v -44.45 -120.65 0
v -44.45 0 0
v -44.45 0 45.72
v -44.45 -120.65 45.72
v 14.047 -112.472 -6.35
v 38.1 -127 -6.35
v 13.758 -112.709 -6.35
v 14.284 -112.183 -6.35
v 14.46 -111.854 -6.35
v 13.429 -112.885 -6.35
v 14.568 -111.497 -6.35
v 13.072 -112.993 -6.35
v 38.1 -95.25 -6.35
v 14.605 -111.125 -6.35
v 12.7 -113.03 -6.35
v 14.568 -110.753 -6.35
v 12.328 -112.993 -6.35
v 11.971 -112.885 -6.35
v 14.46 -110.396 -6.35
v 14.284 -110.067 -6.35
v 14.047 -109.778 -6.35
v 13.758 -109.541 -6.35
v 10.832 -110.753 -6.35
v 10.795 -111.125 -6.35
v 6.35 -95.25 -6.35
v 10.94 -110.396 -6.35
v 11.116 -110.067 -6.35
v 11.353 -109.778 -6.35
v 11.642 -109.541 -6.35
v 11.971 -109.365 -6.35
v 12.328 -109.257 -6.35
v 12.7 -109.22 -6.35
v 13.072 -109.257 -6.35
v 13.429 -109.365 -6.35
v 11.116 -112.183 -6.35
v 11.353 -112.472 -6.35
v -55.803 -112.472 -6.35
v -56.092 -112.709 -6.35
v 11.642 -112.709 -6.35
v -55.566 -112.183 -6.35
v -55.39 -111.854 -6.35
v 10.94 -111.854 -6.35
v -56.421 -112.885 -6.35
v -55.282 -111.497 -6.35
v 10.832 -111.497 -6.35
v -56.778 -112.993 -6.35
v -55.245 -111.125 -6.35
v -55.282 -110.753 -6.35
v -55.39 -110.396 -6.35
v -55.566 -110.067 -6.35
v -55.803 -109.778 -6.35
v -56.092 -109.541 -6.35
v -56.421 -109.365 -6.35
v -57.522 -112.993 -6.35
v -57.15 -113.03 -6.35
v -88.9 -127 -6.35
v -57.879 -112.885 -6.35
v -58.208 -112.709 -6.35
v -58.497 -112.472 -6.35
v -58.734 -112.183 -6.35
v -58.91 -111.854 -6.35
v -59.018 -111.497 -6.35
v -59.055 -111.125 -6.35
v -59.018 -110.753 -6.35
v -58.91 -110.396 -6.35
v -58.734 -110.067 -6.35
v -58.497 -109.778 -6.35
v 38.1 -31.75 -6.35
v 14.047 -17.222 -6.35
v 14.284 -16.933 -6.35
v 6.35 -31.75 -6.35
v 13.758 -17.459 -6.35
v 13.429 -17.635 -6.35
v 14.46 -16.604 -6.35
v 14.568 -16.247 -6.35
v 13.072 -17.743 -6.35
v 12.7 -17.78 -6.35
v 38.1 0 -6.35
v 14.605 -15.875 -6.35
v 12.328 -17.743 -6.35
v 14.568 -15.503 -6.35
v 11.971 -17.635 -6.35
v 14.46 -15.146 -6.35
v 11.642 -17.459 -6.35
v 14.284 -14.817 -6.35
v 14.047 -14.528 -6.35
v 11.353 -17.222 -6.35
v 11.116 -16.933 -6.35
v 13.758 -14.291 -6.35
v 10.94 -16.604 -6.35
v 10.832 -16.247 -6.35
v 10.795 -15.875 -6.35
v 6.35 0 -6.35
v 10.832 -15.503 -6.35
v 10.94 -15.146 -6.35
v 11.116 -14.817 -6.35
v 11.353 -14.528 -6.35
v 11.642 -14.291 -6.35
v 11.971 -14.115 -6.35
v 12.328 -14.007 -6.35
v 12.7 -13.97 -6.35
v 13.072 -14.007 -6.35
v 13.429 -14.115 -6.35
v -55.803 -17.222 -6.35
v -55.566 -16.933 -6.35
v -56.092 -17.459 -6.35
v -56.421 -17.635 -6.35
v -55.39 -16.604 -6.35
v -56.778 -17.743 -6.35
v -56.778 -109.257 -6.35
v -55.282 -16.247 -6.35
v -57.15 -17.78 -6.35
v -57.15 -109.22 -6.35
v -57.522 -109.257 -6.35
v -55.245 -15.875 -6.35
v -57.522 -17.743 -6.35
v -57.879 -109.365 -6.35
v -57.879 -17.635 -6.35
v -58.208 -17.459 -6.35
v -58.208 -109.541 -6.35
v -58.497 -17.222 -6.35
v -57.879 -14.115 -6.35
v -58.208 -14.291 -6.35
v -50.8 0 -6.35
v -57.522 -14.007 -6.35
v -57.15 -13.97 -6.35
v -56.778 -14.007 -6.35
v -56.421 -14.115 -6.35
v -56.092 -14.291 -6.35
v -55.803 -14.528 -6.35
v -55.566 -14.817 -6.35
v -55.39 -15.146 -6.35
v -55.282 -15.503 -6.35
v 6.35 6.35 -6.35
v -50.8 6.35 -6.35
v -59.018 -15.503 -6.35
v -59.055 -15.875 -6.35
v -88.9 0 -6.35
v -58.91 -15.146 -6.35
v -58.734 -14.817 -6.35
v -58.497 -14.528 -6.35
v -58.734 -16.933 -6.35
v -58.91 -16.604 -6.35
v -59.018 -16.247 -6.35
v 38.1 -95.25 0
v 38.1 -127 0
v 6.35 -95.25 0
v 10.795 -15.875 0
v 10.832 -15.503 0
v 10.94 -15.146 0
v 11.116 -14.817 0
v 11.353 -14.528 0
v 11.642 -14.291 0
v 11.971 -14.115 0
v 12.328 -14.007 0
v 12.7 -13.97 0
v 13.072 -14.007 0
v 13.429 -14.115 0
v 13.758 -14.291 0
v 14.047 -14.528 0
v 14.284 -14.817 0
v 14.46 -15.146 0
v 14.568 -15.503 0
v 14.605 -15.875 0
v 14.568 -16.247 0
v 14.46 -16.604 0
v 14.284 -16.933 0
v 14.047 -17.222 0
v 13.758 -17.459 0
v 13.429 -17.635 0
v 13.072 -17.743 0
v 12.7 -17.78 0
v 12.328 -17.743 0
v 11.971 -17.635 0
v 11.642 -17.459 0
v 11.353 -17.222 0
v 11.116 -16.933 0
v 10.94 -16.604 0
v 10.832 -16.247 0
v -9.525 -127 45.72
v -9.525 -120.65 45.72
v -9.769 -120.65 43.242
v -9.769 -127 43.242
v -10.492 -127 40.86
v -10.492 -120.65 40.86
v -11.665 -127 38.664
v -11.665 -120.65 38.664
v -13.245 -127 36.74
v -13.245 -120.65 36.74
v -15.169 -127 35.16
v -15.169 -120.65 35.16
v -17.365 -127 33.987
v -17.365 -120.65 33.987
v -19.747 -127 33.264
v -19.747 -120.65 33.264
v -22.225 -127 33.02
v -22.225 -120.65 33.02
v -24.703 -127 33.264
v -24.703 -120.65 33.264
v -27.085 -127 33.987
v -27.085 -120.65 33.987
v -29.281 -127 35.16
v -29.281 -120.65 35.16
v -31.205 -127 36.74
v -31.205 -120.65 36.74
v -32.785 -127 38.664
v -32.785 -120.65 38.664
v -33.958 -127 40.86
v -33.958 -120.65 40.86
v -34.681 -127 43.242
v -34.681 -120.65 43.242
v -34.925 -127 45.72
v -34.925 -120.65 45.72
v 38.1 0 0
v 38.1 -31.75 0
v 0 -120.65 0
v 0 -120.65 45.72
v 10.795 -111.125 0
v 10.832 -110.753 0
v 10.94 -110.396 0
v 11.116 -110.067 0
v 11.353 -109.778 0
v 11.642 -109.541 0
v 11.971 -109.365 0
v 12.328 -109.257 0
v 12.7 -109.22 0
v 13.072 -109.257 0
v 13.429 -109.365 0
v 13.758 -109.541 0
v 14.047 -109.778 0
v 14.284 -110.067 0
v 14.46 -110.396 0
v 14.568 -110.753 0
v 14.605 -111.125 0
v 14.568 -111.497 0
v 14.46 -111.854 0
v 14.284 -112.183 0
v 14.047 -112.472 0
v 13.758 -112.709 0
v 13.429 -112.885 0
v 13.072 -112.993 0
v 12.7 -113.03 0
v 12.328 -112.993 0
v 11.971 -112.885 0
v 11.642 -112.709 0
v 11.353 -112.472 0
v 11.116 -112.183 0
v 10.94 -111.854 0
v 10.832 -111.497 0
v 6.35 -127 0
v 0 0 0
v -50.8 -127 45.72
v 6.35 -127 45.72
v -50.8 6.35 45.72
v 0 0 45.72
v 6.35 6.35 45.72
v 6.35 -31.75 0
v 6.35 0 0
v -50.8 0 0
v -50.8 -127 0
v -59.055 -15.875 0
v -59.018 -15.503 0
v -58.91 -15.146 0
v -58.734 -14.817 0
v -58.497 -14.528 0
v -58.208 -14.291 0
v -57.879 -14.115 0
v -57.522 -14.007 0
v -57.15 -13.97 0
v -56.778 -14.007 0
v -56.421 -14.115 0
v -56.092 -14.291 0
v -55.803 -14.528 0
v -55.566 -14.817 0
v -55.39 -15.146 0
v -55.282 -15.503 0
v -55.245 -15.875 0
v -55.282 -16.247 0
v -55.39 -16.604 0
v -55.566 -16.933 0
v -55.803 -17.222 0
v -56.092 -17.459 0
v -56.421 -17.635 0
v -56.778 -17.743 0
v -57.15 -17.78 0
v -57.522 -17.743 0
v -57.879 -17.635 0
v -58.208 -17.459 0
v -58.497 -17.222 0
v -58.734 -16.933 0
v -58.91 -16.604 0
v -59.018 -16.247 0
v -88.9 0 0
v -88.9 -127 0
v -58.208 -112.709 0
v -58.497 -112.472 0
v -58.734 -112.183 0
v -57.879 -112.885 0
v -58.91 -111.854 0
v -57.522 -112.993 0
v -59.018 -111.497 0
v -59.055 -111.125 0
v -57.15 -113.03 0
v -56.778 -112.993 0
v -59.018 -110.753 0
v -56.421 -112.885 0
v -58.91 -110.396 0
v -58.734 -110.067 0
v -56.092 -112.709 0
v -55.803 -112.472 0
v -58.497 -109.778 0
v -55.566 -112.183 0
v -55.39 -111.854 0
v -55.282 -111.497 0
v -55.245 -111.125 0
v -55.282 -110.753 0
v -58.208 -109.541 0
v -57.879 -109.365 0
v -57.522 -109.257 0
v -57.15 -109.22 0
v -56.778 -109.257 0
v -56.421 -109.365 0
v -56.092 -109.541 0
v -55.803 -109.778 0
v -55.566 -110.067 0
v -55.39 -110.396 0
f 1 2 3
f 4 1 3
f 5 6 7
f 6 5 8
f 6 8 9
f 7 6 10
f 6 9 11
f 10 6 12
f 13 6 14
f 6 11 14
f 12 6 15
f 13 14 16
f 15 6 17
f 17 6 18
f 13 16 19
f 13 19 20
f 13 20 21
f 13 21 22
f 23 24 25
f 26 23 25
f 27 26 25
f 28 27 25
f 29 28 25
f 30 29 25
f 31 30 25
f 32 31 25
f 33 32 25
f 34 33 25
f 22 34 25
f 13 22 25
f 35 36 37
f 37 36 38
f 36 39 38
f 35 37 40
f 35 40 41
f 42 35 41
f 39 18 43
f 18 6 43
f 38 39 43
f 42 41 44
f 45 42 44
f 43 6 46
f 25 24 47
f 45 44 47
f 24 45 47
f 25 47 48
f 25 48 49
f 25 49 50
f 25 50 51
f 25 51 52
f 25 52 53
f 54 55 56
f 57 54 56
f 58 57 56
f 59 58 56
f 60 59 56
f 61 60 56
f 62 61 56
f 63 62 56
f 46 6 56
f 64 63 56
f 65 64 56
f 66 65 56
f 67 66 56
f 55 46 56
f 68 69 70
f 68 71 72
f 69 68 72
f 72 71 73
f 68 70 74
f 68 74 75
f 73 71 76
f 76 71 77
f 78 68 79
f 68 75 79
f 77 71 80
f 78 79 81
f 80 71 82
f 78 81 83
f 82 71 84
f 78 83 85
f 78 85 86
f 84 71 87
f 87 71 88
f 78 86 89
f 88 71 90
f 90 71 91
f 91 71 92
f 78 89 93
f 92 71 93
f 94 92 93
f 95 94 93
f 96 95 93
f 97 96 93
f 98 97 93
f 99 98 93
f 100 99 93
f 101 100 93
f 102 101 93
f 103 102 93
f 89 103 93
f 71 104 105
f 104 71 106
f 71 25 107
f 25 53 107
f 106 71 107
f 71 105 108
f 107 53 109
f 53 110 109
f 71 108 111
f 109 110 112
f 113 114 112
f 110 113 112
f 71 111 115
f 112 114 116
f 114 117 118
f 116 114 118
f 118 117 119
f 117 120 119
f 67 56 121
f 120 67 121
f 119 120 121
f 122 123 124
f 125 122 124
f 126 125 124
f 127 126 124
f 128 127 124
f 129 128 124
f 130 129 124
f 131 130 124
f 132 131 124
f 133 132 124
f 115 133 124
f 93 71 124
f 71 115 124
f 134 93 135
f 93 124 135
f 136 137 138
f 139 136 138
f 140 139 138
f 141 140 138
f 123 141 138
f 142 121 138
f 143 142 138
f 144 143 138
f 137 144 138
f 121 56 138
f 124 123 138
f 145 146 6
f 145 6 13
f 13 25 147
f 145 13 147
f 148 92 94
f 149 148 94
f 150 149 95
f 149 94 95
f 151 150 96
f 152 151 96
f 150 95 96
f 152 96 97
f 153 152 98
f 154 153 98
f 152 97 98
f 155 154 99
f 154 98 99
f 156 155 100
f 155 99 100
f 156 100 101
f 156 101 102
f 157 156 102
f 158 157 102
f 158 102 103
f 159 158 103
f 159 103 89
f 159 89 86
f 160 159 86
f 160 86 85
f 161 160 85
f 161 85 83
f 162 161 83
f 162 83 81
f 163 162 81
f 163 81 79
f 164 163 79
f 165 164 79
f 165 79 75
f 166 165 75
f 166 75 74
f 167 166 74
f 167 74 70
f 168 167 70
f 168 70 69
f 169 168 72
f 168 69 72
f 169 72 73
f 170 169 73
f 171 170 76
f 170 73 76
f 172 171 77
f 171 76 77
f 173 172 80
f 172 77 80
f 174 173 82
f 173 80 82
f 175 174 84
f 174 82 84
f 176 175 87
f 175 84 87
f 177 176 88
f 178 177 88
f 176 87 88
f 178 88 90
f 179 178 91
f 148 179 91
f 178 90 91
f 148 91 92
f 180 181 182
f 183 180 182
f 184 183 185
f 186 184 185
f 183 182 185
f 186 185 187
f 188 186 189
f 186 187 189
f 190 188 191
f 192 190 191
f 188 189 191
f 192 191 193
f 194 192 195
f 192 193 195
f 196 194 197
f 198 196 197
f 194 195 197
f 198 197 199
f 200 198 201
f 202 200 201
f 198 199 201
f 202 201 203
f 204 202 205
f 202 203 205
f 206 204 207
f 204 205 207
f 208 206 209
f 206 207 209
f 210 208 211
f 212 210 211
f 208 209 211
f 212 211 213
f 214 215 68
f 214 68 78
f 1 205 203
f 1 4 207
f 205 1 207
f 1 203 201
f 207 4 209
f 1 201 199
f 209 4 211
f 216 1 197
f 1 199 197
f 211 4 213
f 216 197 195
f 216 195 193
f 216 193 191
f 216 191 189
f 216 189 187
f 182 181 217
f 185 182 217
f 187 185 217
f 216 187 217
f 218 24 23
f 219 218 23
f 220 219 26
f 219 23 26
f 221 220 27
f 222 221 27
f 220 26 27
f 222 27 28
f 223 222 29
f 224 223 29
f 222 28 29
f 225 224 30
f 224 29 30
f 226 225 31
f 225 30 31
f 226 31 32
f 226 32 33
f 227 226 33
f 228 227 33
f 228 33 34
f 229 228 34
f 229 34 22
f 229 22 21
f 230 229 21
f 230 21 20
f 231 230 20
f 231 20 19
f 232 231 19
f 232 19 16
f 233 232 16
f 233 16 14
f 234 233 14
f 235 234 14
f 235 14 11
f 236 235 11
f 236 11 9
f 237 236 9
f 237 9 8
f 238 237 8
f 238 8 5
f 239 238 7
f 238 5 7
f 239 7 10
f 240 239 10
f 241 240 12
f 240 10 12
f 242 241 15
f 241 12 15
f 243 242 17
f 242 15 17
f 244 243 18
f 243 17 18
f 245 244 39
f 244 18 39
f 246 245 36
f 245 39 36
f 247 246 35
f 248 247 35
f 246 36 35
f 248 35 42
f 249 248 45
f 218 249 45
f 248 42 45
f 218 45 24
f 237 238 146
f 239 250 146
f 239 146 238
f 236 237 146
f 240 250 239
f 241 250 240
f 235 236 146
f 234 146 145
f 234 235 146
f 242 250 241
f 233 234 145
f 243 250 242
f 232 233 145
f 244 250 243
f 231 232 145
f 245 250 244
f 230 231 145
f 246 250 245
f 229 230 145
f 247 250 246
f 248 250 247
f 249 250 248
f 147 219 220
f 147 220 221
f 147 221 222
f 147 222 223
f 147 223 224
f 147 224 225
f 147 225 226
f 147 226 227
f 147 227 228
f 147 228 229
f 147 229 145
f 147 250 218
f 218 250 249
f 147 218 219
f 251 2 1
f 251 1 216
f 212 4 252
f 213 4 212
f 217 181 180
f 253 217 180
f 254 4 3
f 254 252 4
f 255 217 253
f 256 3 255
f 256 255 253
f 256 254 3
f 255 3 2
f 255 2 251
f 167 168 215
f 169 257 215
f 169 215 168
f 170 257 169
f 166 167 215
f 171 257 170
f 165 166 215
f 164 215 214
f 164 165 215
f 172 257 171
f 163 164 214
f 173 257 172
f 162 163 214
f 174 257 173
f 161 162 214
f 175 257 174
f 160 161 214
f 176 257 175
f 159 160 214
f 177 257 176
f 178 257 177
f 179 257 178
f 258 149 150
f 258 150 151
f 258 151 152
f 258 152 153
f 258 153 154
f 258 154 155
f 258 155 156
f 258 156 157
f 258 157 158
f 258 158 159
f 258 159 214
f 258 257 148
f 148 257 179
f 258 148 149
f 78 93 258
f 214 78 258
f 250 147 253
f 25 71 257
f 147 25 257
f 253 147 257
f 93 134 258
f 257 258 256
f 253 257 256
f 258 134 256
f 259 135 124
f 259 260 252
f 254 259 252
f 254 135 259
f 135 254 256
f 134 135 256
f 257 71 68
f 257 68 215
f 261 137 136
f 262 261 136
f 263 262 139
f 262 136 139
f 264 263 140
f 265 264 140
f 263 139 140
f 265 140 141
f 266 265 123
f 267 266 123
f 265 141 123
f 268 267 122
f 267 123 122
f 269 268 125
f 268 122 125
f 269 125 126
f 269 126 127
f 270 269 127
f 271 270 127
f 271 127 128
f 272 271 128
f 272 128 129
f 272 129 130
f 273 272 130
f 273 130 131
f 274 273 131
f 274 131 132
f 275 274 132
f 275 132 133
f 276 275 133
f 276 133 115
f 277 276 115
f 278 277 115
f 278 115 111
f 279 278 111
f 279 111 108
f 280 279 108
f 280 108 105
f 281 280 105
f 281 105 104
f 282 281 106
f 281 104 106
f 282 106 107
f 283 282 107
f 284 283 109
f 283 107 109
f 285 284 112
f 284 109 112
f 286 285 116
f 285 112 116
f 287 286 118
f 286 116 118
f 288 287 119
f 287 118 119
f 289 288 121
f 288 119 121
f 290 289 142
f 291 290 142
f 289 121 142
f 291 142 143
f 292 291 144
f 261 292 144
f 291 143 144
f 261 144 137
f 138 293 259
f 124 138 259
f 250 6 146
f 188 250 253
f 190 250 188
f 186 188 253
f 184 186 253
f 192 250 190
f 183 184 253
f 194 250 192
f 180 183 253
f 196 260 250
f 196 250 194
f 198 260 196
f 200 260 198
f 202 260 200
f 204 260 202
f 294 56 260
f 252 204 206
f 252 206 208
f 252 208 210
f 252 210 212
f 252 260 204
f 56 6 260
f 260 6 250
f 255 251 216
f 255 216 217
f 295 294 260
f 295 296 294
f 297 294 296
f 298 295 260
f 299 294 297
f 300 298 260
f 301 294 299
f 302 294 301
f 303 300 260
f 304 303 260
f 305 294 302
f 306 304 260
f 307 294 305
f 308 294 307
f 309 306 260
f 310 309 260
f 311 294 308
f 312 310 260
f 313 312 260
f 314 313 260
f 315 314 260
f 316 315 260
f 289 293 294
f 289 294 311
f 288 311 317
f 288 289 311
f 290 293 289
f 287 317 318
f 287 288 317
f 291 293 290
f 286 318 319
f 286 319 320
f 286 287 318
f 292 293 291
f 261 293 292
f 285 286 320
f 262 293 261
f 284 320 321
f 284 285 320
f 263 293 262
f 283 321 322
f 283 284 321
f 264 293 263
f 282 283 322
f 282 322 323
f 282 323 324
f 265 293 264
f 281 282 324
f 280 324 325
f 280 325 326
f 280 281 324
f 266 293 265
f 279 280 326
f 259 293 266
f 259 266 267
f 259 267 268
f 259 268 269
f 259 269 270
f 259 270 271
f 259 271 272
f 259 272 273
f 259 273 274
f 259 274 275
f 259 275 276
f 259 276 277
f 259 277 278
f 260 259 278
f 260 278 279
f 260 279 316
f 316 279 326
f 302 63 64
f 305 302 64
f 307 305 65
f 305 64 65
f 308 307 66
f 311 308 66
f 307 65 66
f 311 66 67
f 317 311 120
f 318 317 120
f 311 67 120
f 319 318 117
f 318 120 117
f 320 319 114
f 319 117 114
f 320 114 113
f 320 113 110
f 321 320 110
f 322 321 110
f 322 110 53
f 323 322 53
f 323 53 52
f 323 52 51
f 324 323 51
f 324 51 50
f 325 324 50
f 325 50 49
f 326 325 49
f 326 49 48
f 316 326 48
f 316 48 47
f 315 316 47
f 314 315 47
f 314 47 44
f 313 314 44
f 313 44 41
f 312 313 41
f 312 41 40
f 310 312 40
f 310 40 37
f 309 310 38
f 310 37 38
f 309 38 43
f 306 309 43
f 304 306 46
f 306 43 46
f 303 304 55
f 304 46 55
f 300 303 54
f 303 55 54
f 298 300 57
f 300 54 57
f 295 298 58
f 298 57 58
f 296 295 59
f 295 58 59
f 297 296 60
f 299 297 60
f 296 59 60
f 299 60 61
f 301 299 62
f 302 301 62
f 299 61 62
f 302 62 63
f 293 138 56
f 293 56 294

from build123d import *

# Parameters (mm, degrees)
F0_W      = 44.45
F0_H      = 45.72
F1_DEPTH  = 120.65
F2_T      = 6.35
F4_W      = 38.1
F4_H      = 6.35
F5_DEPTH  = 127
F6_W      = 31.75
F6_H      = 6.35
F7_DEPTH  = 38.1
F3_W      = 31.75
F3_H      = 6.35
F8_DEPTH  = 38.1
F10_D     = 3.81
F12_D     = 3.81
F14_D     = 3.81
F16_D     = 3.81
F18_D     = 25.4
F18_DEPTH = 15.1
F18_TIP   = 7.6309298617


with BuildPart() as f1:
    # F0 (on Front) → F1 (new body)
    with BuildSketch(Plane.XZ):
        with Locations((-22.225, 22.86)):
            Rectangle(F0_W, F0_H)
    extrude(amount=F1_DEPTH)

    # F2
    f2_openings = [f1.faces().sort_by_distance(p)[0] for p in [
        (-22.225, -60.325, 45.72),
    ]]
    offset(amount=F2_T, openings=f2_openings, kind=Kind.INTERSECTION)

    # F4 (on Front) → F5 (join)
    with BuildSketch(Plane.XZ):
        with Locations((-69.85, -3.175)):
            Rectangle(F4_W, F4_H)
    extrude(amount=F5_DEPTH)

    # F6 (on Right) → F7 (join)
    with BuildSketch(Plane.YZ):
        with Locations((-111.125, -3.175)):
            Rectangle(F6_W, F6_H)
    extrude(amount=F7_DEPTH)

    # F3 (on Right) → F8 (join)
    with BuildSketch(Plane.YZ):
        with Locations((-15.875, -3.175)):
            Rectangle(F3_W, F3_H)
    extrude(amount=F8_DEPTH)

    # F10 (through all)
    with Locations(Plane.XY):
        with Locations((-57.15, -111.125)):
            Hole(F10_D / 2)

    # F12 (through all)
    with Locations(Plane.XY):
        with Locations((-57.15, -15.875)):
            Hole(F12_D / 2)

    # F14 (through all)
    with Locations(Plane.XY):
        with Locations((12.7, -111.125)):
            Hole(F14_D / 2)

    # F16 (through all)
    with Locations(Plane.XY):
        with Locations((12.7, -15.875)):
            Hole(F16_D / 2)

    # F18
    with Locations(Plane.XZ.offset(127)):
        with Locations((-22.225, 45.72)):
            Hole(F18_D / 2, depth=F18_DEPTH)
            with Locations((0, 0, -(F18_DEPTH + F18_TIP / 2))):  # 118° drill point
                Cone(0, F18_D / 2, F18_TIP, mode=Mode.SUBTRACT)


solid = f1.part
